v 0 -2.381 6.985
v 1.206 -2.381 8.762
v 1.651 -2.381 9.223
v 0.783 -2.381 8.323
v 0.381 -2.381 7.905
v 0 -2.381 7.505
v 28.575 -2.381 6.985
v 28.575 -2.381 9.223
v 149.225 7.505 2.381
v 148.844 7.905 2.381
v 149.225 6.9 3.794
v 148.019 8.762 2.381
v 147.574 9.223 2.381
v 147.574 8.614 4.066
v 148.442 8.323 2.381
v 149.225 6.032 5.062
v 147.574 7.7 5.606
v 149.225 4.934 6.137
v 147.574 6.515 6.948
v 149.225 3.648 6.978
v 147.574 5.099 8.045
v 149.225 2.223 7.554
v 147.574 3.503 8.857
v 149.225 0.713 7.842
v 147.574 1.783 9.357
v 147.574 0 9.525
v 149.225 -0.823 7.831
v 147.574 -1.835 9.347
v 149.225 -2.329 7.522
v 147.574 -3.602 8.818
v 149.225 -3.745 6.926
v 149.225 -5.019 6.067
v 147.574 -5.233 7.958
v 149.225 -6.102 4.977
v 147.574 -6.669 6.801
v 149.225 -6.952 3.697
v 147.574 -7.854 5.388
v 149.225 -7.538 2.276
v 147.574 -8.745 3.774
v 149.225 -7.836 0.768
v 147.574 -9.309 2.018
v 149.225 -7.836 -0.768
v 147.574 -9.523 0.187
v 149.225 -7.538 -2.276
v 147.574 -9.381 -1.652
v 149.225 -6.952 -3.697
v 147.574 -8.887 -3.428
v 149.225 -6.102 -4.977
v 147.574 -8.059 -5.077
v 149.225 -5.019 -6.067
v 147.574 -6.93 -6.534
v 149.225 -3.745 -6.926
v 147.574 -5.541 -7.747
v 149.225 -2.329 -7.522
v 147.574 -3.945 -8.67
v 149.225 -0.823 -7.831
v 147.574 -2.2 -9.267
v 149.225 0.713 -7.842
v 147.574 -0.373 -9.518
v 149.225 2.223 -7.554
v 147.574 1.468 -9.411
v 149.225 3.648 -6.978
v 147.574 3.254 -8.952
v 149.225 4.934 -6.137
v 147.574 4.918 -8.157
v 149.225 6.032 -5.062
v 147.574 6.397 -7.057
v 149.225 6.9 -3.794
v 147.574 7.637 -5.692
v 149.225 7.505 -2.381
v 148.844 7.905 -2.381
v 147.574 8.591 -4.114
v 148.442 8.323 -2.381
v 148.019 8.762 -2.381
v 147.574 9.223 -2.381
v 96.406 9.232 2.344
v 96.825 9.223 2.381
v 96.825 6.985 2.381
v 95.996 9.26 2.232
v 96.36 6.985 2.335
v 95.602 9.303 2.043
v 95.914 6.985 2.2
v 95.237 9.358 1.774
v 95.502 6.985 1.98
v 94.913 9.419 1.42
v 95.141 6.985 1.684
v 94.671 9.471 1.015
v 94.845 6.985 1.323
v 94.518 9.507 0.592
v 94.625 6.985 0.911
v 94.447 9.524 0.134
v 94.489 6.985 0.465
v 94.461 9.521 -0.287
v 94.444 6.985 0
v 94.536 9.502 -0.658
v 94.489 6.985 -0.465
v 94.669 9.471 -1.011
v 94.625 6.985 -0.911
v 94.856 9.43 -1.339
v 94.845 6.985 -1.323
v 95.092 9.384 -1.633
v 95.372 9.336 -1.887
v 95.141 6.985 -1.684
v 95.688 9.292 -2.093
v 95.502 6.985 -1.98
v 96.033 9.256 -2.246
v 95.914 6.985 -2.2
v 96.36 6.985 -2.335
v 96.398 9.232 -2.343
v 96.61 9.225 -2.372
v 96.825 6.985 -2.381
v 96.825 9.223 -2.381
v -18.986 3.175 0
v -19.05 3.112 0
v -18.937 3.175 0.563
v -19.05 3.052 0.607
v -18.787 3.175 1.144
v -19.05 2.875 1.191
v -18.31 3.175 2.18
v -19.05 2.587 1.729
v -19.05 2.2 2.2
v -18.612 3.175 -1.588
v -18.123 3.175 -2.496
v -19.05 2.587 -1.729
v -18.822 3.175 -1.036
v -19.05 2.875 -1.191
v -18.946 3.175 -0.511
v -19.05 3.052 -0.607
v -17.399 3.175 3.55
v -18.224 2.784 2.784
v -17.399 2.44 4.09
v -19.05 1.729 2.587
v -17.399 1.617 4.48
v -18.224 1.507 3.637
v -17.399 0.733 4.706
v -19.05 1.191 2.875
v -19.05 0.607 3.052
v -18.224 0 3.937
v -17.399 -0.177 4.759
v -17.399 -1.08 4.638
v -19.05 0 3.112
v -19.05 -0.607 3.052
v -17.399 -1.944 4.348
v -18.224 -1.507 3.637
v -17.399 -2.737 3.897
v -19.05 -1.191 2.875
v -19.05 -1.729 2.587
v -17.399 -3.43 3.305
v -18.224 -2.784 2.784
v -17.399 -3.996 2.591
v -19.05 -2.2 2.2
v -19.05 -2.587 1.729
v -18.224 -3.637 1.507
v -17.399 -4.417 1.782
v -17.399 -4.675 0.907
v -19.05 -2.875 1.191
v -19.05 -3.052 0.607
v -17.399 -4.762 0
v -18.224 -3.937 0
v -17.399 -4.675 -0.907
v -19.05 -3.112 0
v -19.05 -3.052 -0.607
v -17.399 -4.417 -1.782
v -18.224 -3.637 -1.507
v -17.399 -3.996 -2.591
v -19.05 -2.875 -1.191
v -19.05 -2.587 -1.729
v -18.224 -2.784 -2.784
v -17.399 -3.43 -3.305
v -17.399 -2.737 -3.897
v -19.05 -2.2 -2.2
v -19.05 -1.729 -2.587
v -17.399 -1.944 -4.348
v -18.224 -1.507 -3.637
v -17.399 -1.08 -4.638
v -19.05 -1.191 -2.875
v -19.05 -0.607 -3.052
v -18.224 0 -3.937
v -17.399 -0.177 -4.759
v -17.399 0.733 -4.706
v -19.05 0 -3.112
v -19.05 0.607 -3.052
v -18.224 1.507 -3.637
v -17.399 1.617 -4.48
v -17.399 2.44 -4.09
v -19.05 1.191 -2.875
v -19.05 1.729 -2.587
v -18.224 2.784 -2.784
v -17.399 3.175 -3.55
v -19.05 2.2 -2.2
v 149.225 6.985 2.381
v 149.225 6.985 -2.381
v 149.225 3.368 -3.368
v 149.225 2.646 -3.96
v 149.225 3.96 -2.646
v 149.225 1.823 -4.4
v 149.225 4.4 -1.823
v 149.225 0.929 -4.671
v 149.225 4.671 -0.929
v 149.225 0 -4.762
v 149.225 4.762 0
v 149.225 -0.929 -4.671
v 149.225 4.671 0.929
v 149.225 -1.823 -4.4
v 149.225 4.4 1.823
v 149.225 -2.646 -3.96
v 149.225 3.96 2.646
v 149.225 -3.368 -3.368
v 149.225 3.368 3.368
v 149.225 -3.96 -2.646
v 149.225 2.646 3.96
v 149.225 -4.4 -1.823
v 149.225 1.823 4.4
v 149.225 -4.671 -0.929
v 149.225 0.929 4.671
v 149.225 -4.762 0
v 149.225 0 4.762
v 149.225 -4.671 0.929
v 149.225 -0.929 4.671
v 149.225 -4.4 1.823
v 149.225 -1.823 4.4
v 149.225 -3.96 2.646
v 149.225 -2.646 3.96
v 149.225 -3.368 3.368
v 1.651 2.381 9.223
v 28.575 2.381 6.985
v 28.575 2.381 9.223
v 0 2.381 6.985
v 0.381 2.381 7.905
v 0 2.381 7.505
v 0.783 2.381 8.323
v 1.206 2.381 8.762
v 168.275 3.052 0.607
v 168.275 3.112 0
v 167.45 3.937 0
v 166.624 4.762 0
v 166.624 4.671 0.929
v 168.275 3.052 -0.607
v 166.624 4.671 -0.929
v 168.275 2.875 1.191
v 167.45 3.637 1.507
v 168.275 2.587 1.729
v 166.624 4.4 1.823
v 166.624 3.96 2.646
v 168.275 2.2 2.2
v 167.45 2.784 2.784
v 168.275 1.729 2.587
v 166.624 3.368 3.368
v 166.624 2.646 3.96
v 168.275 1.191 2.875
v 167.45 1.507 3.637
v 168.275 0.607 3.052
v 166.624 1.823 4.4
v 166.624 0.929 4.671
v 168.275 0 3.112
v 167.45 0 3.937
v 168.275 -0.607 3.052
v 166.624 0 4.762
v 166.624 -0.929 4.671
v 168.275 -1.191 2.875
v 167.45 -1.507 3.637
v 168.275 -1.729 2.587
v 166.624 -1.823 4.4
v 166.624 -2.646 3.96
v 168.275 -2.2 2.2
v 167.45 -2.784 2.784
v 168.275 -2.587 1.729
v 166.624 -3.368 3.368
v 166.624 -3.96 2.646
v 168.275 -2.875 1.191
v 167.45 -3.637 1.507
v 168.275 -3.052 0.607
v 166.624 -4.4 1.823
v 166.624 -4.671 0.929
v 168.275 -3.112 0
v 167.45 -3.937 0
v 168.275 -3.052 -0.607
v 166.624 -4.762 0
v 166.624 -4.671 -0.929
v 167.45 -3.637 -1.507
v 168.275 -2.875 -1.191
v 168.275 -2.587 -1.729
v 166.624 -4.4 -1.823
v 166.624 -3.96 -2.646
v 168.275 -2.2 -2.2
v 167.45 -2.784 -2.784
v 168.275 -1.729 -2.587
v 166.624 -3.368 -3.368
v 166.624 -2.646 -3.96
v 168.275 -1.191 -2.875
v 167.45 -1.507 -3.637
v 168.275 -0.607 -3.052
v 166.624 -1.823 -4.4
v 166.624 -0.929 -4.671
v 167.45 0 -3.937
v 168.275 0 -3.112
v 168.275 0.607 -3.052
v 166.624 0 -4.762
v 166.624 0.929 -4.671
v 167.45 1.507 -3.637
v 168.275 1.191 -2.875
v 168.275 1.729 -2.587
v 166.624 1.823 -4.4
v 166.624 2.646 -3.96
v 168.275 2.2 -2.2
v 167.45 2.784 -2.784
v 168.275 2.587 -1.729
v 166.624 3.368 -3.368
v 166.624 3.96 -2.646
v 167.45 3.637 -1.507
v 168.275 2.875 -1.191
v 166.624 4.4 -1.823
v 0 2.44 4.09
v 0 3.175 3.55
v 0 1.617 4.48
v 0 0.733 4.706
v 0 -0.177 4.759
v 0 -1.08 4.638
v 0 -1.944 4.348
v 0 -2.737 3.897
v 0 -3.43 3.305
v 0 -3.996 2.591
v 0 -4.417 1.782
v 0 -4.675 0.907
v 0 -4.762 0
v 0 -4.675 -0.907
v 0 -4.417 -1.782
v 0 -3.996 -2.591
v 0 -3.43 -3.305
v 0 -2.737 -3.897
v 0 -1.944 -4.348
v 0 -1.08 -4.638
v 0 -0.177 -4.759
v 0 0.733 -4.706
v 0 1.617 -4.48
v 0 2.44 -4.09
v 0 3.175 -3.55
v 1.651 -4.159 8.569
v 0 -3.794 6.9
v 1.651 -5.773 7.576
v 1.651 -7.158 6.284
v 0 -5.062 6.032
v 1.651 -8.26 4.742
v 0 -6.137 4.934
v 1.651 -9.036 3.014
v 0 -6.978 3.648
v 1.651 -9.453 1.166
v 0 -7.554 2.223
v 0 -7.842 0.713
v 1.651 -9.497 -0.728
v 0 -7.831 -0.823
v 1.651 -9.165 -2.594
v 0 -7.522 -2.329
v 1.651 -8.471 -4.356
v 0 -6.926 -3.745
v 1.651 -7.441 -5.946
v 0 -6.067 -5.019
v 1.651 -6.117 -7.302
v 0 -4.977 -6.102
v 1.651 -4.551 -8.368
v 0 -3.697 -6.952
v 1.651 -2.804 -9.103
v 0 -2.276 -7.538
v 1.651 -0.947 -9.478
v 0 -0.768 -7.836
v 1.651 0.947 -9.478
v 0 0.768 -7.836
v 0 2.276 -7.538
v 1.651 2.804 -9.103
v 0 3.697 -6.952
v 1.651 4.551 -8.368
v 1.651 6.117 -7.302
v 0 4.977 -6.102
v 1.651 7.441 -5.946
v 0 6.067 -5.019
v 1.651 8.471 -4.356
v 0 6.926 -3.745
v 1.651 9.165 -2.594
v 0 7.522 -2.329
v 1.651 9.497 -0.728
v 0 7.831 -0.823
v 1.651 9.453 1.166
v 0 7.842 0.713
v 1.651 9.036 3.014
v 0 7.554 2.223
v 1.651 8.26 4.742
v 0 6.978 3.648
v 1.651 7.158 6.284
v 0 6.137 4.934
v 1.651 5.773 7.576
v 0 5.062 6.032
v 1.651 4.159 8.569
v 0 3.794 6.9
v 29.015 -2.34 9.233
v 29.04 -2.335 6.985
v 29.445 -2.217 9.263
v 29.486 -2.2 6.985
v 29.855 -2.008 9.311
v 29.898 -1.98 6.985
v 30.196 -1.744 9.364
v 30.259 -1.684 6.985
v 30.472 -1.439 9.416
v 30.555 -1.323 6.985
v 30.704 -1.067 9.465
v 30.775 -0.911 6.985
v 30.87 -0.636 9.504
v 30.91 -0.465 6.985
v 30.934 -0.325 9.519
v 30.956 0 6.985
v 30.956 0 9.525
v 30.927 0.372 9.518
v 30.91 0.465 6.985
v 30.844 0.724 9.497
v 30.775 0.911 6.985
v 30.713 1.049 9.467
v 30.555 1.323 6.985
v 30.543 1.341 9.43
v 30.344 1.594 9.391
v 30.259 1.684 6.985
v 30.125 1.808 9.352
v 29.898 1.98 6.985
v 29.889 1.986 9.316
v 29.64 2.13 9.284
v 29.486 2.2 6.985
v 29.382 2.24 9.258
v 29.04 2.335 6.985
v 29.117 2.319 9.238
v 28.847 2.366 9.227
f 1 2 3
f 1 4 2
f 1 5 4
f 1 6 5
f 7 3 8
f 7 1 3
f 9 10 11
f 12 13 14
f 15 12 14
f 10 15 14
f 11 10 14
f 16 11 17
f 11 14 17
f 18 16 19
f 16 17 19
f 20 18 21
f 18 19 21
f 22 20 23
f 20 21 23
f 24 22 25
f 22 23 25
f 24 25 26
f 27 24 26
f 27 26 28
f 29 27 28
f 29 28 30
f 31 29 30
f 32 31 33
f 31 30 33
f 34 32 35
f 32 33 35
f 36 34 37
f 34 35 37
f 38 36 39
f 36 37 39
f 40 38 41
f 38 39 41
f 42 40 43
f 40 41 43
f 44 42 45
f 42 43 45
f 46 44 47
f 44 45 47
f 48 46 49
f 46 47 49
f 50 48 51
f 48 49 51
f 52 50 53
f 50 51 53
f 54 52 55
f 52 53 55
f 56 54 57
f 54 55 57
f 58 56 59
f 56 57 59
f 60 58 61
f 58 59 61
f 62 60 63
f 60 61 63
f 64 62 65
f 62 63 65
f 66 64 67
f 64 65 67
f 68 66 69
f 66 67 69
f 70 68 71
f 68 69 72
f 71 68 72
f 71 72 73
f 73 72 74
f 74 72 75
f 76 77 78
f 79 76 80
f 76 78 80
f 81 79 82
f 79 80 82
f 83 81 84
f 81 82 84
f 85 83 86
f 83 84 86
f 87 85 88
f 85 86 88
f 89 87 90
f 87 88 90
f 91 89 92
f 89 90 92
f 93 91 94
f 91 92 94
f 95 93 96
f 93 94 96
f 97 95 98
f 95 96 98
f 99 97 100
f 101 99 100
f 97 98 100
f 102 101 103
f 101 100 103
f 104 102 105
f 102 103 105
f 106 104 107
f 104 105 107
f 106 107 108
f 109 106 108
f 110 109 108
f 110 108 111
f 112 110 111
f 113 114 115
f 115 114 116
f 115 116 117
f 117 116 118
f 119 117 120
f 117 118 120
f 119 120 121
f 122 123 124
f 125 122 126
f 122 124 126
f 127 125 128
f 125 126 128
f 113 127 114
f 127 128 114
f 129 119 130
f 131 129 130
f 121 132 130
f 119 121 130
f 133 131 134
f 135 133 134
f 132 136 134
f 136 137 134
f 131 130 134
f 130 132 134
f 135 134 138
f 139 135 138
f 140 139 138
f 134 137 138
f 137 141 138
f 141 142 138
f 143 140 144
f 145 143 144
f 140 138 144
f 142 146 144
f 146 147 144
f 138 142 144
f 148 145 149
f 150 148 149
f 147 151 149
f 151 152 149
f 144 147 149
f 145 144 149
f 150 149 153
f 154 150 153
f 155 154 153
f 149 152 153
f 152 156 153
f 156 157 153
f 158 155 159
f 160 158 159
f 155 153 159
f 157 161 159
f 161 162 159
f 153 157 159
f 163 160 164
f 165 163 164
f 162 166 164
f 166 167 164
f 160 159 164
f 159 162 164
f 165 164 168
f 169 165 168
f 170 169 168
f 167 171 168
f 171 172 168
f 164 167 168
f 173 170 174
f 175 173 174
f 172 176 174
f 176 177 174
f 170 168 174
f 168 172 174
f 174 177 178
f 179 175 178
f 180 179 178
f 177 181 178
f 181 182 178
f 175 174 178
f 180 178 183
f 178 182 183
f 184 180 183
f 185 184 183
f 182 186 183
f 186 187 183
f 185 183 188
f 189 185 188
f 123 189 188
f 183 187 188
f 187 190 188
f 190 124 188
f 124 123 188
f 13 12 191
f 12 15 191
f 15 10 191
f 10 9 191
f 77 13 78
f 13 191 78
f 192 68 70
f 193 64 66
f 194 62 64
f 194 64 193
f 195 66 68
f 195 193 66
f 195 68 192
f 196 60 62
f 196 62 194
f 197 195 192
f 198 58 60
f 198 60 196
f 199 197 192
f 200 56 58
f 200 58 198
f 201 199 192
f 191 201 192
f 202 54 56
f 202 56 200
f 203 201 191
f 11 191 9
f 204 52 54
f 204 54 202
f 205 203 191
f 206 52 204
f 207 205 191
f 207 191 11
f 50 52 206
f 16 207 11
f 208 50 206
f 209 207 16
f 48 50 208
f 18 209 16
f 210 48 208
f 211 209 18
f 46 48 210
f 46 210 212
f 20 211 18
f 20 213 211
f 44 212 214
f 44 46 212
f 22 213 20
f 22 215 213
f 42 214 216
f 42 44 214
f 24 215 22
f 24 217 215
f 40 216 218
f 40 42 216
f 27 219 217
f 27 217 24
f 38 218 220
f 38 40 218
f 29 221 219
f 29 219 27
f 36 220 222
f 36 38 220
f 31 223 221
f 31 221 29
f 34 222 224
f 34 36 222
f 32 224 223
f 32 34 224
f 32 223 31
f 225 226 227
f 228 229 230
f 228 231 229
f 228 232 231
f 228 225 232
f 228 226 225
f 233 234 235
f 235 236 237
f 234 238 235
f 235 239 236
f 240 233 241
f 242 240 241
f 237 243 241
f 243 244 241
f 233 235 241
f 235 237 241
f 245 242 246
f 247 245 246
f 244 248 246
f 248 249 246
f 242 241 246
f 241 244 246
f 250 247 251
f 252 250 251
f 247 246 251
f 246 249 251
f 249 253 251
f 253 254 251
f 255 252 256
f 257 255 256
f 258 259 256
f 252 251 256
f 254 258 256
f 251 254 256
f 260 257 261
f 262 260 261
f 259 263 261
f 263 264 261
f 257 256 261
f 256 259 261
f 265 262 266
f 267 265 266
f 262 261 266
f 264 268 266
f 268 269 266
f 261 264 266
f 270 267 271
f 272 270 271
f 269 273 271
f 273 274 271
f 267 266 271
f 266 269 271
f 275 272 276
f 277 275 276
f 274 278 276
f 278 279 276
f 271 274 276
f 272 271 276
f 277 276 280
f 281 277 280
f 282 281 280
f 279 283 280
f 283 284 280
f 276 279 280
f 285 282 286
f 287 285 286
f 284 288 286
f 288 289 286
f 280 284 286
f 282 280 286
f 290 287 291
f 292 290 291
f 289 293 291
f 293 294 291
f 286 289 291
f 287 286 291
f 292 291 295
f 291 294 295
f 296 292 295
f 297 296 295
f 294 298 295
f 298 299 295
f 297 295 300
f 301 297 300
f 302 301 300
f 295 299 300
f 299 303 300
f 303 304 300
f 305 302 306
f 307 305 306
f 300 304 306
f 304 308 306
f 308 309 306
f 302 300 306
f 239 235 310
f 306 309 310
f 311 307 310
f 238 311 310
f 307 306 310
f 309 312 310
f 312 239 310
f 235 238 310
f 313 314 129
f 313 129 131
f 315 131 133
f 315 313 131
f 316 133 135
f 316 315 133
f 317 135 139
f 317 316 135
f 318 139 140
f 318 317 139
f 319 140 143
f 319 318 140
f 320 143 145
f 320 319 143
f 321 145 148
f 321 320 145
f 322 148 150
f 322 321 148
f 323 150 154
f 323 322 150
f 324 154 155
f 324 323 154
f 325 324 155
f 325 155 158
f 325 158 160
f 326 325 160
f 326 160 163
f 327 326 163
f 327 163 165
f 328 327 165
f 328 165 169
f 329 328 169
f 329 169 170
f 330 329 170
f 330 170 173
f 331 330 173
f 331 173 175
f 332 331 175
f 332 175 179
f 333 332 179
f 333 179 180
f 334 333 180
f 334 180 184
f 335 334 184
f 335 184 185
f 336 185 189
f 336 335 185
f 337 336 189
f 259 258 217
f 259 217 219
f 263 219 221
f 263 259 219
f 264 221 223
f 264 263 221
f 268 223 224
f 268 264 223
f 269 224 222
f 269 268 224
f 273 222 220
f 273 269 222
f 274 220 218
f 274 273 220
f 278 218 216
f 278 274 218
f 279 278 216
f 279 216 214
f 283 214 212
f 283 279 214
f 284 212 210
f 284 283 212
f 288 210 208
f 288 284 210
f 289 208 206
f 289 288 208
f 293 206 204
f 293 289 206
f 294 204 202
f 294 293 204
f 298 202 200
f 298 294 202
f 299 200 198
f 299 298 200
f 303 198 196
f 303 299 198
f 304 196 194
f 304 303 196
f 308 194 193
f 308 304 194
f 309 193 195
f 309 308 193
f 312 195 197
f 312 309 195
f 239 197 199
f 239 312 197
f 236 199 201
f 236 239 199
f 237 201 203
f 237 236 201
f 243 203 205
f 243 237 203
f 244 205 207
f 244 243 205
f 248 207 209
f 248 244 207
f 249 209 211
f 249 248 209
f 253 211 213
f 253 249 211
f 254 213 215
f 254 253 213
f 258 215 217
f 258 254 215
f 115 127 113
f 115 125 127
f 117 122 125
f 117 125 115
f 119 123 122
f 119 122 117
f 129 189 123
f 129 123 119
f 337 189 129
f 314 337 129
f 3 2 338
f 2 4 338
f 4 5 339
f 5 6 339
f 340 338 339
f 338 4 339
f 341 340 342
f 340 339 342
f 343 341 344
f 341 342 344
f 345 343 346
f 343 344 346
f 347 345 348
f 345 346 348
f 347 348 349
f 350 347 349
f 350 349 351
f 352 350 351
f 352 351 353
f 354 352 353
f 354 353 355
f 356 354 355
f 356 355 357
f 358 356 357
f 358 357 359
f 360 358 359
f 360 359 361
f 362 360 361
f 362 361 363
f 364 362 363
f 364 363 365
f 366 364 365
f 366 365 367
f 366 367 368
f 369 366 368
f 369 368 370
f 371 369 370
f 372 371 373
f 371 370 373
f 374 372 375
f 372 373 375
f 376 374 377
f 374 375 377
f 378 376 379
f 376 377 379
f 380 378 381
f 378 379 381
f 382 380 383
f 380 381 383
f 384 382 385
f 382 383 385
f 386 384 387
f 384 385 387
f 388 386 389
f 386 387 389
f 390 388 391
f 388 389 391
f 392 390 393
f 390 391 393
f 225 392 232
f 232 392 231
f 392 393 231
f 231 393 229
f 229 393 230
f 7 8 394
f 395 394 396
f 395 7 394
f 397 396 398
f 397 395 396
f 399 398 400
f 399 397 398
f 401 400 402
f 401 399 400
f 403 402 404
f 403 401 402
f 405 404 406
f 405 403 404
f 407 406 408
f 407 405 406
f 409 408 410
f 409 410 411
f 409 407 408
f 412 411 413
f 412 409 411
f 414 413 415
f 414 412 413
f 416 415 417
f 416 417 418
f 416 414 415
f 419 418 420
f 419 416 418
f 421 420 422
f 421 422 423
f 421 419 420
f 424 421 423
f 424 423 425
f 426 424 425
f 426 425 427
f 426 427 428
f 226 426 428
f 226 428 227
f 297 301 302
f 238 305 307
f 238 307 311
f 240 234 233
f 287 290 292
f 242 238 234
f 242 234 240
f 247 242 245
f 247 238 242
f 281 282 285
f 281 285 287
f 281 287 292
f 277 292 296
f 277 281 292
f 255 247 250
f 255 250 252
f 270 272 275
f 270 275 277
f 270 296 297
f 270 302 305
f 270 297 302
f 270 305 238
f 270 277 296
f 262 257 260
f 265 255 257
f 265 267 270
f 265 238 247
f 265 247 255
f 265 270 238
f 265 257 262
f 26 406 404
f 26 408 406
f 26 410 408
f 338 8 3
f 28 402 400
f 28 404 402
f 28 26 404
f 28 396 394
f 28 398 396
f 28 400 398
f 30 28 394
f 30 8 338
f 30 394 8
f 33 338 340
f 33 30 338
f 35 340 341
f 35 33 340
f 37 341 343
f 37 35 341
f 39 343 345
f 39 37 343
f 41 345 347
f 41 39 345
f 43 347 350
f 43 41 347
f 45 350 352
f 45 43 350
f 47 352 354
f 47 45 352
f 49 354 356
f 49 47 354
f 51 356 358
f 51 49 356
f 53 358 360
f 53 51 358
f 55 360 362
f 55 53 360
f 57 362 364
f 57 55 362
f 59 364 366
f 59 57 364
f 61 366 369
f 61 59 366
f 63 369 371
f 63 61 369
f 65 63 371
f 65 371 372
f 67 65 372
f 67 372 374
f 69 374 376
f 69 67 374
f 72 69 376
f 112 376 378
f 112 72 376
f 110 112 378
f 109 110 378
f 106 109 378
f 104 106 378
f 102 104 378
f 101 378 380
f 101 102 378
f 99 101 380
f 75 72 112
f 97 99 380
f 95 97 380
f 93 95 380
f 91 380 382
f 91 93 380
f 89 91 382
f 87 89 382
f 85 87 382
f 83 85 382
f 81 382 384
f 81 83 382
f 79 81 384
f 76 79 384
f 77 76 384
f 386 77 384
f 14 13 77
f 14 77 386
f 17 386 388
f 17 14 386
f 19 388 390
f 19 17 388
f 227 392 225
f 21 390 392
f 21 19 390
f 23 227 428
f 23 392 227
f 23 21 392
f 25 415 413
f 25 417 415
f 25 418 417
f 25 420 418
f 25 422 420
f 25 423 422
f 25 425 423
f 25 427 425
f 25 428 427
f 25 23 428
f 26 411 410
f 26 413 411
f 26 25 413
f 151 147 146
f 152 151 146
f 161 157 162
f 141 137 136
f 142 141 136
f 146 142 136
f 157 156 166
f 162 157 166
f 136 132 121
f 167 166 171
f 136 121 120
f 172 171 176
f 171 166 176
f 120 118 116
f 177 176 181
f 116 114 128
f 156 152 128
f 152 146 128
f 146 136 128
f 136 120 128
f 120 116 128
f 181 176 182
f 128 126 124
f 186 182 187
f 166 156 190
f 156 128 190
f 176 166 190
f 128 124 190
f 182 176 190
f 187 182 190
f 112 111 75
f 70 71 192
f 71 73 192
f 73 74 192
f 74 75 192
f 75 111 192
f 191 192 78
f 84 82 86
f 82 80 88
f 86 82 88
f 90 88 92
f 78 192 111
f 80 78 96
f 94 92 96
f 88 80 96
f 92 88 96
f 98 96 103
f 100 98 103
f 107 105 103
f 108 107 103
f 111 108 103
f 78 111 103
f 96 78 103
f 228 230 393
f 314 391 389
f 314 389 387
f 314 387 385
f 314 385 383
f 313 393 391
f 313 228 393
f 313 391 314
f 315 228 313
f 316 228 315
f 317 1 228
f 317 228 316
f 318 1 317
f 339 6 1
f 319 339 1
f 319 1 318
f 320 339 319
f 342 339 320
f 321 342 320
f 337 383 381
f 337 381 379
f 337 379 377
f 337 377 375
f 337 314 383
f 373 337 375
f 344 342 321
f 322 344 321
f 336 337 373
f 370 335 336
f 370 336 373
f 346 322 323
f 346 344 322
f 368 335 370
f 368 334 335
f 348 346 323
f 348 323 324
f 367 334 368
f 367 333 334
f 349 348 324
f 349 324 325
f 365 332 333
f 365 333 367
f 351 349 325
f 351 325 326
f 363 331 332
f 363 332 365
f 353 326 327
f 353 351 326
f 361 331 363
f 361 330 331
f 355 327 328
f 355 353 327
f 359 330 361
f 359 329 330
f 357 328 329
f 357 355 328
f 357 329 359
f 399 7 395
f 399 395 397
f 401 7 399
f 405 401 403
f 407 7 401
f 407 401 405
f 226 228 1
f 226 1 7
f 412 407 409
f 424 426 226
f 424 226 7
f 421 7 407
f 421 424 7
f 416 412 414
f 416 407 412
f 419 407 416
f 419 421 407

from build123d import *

# Parameters (mm, degrees)
BOSS_EXTRUDE1_DEPTH = 19.05
CUT_EXTRUDE1_START  = 6.985
CUT_EXTRUDE1_DEPTH  = 19.05
CUT_EXTRUDE2_START  = 6.985
CUT_EXTRUDE2_DEPTH  = 19.05


with BuildPart() as part:
    # Sketch1 → Revolve1 (revolve)
    with BuildSketch(Plane.XY, mode=Mode.PRIVATE) as revolve1_sk:
        Polygon((0, 0), (0, 9.525), (149.225, 9.525), (149.225, 4.7625), (168.275, 4.7625), (168.275, 0), align=None)
    revolve(revolve1_sk.sketch.rotate(Axis((0, 0, 0), (1, 0, 0)), 90), axis=Axis((0, 0, 0), (1, 0, 0)))

    # Sketch2 → Boss-Extrude1 (add)
    with BuildSketch(Plane.ZY):
        with BuildLine():
            Line((-3.549757914, 3.175), (3.549757914, 3.175))
            ThreePointArc((3.549757914, 3.175), (0, -4.7625), (-3.549757914, 3.175))
        make_face()
    extrude(amount=BOSS_EXTRUDE1_DEPTH)

    # Chamfer1: read off the stored shape, not the designer's step
    # Chamfer1 outline → Chamfer1 (revolve, cut)
    with BuildSketch(Plane.YX):
        Polygon((4.7625, 168.275), (3.1115, 168.275), (4.7625, 166.624), align=None)
        Polygon((9.525, 149.225), (7.874, 149.225), (9.525, 147.574), align=None)
        Polygon((9.525, 0), (9.525, 1.651), (7.874, 0), align=None)
        Polygon((4.7625, -19.05), (4.7625, -17.399), (3.1115, -19.05), align=None)
    revolve(axis=Axis((0, 0, 0), (1, 0, 0)), mode=Mode.SUBTRACT)

    # Sketch4 → Cut-Extrude1 (cut)
    with BuildSketch(Plane.XY.offset(CUT_EXTRUDE1_START)):
        with BuildLine():
            Line((0, 2.38125), (0, -2.38125))
            Line((0, -2.38125), (28.575, -2.38125))
            ThreePointArc((28.575, -2.38125), (30.95625, 0), (28.575, 2.38125))
            Line((28.575, 2.38125), (0, 2.38125))
        make_face()
    extrude(amount=CUT_EXTRUDE1_DEPTH, mode=Mode.SUBTRACT)

    # Sketch5 → Cut-Extrude2 (cut)
    with BuildSketch(Plane(origin=(0, 0, 0), x_dir=(1, 0, 0), z_dir=(0, 1, 0)).offset(CUT_EXTRUDE2_START)):
        with BuildLine():
            Line((149.225, 2.38125), (149.225, -2.38125))
            Line((149.225, -2.38125), (96.8248, -2.38125))
            ThreePointArc((96.8248, -2.38125), (94.44355, 0), (96.8248, 2.38125))
            Line((96.8248, 2.38125), (149.225, 2.38125))
        make_face()
    extrude(amount=CUT_EXTRUDE2_DEPTH, mode=Mode.SUBTRACT)


solid = part.part
